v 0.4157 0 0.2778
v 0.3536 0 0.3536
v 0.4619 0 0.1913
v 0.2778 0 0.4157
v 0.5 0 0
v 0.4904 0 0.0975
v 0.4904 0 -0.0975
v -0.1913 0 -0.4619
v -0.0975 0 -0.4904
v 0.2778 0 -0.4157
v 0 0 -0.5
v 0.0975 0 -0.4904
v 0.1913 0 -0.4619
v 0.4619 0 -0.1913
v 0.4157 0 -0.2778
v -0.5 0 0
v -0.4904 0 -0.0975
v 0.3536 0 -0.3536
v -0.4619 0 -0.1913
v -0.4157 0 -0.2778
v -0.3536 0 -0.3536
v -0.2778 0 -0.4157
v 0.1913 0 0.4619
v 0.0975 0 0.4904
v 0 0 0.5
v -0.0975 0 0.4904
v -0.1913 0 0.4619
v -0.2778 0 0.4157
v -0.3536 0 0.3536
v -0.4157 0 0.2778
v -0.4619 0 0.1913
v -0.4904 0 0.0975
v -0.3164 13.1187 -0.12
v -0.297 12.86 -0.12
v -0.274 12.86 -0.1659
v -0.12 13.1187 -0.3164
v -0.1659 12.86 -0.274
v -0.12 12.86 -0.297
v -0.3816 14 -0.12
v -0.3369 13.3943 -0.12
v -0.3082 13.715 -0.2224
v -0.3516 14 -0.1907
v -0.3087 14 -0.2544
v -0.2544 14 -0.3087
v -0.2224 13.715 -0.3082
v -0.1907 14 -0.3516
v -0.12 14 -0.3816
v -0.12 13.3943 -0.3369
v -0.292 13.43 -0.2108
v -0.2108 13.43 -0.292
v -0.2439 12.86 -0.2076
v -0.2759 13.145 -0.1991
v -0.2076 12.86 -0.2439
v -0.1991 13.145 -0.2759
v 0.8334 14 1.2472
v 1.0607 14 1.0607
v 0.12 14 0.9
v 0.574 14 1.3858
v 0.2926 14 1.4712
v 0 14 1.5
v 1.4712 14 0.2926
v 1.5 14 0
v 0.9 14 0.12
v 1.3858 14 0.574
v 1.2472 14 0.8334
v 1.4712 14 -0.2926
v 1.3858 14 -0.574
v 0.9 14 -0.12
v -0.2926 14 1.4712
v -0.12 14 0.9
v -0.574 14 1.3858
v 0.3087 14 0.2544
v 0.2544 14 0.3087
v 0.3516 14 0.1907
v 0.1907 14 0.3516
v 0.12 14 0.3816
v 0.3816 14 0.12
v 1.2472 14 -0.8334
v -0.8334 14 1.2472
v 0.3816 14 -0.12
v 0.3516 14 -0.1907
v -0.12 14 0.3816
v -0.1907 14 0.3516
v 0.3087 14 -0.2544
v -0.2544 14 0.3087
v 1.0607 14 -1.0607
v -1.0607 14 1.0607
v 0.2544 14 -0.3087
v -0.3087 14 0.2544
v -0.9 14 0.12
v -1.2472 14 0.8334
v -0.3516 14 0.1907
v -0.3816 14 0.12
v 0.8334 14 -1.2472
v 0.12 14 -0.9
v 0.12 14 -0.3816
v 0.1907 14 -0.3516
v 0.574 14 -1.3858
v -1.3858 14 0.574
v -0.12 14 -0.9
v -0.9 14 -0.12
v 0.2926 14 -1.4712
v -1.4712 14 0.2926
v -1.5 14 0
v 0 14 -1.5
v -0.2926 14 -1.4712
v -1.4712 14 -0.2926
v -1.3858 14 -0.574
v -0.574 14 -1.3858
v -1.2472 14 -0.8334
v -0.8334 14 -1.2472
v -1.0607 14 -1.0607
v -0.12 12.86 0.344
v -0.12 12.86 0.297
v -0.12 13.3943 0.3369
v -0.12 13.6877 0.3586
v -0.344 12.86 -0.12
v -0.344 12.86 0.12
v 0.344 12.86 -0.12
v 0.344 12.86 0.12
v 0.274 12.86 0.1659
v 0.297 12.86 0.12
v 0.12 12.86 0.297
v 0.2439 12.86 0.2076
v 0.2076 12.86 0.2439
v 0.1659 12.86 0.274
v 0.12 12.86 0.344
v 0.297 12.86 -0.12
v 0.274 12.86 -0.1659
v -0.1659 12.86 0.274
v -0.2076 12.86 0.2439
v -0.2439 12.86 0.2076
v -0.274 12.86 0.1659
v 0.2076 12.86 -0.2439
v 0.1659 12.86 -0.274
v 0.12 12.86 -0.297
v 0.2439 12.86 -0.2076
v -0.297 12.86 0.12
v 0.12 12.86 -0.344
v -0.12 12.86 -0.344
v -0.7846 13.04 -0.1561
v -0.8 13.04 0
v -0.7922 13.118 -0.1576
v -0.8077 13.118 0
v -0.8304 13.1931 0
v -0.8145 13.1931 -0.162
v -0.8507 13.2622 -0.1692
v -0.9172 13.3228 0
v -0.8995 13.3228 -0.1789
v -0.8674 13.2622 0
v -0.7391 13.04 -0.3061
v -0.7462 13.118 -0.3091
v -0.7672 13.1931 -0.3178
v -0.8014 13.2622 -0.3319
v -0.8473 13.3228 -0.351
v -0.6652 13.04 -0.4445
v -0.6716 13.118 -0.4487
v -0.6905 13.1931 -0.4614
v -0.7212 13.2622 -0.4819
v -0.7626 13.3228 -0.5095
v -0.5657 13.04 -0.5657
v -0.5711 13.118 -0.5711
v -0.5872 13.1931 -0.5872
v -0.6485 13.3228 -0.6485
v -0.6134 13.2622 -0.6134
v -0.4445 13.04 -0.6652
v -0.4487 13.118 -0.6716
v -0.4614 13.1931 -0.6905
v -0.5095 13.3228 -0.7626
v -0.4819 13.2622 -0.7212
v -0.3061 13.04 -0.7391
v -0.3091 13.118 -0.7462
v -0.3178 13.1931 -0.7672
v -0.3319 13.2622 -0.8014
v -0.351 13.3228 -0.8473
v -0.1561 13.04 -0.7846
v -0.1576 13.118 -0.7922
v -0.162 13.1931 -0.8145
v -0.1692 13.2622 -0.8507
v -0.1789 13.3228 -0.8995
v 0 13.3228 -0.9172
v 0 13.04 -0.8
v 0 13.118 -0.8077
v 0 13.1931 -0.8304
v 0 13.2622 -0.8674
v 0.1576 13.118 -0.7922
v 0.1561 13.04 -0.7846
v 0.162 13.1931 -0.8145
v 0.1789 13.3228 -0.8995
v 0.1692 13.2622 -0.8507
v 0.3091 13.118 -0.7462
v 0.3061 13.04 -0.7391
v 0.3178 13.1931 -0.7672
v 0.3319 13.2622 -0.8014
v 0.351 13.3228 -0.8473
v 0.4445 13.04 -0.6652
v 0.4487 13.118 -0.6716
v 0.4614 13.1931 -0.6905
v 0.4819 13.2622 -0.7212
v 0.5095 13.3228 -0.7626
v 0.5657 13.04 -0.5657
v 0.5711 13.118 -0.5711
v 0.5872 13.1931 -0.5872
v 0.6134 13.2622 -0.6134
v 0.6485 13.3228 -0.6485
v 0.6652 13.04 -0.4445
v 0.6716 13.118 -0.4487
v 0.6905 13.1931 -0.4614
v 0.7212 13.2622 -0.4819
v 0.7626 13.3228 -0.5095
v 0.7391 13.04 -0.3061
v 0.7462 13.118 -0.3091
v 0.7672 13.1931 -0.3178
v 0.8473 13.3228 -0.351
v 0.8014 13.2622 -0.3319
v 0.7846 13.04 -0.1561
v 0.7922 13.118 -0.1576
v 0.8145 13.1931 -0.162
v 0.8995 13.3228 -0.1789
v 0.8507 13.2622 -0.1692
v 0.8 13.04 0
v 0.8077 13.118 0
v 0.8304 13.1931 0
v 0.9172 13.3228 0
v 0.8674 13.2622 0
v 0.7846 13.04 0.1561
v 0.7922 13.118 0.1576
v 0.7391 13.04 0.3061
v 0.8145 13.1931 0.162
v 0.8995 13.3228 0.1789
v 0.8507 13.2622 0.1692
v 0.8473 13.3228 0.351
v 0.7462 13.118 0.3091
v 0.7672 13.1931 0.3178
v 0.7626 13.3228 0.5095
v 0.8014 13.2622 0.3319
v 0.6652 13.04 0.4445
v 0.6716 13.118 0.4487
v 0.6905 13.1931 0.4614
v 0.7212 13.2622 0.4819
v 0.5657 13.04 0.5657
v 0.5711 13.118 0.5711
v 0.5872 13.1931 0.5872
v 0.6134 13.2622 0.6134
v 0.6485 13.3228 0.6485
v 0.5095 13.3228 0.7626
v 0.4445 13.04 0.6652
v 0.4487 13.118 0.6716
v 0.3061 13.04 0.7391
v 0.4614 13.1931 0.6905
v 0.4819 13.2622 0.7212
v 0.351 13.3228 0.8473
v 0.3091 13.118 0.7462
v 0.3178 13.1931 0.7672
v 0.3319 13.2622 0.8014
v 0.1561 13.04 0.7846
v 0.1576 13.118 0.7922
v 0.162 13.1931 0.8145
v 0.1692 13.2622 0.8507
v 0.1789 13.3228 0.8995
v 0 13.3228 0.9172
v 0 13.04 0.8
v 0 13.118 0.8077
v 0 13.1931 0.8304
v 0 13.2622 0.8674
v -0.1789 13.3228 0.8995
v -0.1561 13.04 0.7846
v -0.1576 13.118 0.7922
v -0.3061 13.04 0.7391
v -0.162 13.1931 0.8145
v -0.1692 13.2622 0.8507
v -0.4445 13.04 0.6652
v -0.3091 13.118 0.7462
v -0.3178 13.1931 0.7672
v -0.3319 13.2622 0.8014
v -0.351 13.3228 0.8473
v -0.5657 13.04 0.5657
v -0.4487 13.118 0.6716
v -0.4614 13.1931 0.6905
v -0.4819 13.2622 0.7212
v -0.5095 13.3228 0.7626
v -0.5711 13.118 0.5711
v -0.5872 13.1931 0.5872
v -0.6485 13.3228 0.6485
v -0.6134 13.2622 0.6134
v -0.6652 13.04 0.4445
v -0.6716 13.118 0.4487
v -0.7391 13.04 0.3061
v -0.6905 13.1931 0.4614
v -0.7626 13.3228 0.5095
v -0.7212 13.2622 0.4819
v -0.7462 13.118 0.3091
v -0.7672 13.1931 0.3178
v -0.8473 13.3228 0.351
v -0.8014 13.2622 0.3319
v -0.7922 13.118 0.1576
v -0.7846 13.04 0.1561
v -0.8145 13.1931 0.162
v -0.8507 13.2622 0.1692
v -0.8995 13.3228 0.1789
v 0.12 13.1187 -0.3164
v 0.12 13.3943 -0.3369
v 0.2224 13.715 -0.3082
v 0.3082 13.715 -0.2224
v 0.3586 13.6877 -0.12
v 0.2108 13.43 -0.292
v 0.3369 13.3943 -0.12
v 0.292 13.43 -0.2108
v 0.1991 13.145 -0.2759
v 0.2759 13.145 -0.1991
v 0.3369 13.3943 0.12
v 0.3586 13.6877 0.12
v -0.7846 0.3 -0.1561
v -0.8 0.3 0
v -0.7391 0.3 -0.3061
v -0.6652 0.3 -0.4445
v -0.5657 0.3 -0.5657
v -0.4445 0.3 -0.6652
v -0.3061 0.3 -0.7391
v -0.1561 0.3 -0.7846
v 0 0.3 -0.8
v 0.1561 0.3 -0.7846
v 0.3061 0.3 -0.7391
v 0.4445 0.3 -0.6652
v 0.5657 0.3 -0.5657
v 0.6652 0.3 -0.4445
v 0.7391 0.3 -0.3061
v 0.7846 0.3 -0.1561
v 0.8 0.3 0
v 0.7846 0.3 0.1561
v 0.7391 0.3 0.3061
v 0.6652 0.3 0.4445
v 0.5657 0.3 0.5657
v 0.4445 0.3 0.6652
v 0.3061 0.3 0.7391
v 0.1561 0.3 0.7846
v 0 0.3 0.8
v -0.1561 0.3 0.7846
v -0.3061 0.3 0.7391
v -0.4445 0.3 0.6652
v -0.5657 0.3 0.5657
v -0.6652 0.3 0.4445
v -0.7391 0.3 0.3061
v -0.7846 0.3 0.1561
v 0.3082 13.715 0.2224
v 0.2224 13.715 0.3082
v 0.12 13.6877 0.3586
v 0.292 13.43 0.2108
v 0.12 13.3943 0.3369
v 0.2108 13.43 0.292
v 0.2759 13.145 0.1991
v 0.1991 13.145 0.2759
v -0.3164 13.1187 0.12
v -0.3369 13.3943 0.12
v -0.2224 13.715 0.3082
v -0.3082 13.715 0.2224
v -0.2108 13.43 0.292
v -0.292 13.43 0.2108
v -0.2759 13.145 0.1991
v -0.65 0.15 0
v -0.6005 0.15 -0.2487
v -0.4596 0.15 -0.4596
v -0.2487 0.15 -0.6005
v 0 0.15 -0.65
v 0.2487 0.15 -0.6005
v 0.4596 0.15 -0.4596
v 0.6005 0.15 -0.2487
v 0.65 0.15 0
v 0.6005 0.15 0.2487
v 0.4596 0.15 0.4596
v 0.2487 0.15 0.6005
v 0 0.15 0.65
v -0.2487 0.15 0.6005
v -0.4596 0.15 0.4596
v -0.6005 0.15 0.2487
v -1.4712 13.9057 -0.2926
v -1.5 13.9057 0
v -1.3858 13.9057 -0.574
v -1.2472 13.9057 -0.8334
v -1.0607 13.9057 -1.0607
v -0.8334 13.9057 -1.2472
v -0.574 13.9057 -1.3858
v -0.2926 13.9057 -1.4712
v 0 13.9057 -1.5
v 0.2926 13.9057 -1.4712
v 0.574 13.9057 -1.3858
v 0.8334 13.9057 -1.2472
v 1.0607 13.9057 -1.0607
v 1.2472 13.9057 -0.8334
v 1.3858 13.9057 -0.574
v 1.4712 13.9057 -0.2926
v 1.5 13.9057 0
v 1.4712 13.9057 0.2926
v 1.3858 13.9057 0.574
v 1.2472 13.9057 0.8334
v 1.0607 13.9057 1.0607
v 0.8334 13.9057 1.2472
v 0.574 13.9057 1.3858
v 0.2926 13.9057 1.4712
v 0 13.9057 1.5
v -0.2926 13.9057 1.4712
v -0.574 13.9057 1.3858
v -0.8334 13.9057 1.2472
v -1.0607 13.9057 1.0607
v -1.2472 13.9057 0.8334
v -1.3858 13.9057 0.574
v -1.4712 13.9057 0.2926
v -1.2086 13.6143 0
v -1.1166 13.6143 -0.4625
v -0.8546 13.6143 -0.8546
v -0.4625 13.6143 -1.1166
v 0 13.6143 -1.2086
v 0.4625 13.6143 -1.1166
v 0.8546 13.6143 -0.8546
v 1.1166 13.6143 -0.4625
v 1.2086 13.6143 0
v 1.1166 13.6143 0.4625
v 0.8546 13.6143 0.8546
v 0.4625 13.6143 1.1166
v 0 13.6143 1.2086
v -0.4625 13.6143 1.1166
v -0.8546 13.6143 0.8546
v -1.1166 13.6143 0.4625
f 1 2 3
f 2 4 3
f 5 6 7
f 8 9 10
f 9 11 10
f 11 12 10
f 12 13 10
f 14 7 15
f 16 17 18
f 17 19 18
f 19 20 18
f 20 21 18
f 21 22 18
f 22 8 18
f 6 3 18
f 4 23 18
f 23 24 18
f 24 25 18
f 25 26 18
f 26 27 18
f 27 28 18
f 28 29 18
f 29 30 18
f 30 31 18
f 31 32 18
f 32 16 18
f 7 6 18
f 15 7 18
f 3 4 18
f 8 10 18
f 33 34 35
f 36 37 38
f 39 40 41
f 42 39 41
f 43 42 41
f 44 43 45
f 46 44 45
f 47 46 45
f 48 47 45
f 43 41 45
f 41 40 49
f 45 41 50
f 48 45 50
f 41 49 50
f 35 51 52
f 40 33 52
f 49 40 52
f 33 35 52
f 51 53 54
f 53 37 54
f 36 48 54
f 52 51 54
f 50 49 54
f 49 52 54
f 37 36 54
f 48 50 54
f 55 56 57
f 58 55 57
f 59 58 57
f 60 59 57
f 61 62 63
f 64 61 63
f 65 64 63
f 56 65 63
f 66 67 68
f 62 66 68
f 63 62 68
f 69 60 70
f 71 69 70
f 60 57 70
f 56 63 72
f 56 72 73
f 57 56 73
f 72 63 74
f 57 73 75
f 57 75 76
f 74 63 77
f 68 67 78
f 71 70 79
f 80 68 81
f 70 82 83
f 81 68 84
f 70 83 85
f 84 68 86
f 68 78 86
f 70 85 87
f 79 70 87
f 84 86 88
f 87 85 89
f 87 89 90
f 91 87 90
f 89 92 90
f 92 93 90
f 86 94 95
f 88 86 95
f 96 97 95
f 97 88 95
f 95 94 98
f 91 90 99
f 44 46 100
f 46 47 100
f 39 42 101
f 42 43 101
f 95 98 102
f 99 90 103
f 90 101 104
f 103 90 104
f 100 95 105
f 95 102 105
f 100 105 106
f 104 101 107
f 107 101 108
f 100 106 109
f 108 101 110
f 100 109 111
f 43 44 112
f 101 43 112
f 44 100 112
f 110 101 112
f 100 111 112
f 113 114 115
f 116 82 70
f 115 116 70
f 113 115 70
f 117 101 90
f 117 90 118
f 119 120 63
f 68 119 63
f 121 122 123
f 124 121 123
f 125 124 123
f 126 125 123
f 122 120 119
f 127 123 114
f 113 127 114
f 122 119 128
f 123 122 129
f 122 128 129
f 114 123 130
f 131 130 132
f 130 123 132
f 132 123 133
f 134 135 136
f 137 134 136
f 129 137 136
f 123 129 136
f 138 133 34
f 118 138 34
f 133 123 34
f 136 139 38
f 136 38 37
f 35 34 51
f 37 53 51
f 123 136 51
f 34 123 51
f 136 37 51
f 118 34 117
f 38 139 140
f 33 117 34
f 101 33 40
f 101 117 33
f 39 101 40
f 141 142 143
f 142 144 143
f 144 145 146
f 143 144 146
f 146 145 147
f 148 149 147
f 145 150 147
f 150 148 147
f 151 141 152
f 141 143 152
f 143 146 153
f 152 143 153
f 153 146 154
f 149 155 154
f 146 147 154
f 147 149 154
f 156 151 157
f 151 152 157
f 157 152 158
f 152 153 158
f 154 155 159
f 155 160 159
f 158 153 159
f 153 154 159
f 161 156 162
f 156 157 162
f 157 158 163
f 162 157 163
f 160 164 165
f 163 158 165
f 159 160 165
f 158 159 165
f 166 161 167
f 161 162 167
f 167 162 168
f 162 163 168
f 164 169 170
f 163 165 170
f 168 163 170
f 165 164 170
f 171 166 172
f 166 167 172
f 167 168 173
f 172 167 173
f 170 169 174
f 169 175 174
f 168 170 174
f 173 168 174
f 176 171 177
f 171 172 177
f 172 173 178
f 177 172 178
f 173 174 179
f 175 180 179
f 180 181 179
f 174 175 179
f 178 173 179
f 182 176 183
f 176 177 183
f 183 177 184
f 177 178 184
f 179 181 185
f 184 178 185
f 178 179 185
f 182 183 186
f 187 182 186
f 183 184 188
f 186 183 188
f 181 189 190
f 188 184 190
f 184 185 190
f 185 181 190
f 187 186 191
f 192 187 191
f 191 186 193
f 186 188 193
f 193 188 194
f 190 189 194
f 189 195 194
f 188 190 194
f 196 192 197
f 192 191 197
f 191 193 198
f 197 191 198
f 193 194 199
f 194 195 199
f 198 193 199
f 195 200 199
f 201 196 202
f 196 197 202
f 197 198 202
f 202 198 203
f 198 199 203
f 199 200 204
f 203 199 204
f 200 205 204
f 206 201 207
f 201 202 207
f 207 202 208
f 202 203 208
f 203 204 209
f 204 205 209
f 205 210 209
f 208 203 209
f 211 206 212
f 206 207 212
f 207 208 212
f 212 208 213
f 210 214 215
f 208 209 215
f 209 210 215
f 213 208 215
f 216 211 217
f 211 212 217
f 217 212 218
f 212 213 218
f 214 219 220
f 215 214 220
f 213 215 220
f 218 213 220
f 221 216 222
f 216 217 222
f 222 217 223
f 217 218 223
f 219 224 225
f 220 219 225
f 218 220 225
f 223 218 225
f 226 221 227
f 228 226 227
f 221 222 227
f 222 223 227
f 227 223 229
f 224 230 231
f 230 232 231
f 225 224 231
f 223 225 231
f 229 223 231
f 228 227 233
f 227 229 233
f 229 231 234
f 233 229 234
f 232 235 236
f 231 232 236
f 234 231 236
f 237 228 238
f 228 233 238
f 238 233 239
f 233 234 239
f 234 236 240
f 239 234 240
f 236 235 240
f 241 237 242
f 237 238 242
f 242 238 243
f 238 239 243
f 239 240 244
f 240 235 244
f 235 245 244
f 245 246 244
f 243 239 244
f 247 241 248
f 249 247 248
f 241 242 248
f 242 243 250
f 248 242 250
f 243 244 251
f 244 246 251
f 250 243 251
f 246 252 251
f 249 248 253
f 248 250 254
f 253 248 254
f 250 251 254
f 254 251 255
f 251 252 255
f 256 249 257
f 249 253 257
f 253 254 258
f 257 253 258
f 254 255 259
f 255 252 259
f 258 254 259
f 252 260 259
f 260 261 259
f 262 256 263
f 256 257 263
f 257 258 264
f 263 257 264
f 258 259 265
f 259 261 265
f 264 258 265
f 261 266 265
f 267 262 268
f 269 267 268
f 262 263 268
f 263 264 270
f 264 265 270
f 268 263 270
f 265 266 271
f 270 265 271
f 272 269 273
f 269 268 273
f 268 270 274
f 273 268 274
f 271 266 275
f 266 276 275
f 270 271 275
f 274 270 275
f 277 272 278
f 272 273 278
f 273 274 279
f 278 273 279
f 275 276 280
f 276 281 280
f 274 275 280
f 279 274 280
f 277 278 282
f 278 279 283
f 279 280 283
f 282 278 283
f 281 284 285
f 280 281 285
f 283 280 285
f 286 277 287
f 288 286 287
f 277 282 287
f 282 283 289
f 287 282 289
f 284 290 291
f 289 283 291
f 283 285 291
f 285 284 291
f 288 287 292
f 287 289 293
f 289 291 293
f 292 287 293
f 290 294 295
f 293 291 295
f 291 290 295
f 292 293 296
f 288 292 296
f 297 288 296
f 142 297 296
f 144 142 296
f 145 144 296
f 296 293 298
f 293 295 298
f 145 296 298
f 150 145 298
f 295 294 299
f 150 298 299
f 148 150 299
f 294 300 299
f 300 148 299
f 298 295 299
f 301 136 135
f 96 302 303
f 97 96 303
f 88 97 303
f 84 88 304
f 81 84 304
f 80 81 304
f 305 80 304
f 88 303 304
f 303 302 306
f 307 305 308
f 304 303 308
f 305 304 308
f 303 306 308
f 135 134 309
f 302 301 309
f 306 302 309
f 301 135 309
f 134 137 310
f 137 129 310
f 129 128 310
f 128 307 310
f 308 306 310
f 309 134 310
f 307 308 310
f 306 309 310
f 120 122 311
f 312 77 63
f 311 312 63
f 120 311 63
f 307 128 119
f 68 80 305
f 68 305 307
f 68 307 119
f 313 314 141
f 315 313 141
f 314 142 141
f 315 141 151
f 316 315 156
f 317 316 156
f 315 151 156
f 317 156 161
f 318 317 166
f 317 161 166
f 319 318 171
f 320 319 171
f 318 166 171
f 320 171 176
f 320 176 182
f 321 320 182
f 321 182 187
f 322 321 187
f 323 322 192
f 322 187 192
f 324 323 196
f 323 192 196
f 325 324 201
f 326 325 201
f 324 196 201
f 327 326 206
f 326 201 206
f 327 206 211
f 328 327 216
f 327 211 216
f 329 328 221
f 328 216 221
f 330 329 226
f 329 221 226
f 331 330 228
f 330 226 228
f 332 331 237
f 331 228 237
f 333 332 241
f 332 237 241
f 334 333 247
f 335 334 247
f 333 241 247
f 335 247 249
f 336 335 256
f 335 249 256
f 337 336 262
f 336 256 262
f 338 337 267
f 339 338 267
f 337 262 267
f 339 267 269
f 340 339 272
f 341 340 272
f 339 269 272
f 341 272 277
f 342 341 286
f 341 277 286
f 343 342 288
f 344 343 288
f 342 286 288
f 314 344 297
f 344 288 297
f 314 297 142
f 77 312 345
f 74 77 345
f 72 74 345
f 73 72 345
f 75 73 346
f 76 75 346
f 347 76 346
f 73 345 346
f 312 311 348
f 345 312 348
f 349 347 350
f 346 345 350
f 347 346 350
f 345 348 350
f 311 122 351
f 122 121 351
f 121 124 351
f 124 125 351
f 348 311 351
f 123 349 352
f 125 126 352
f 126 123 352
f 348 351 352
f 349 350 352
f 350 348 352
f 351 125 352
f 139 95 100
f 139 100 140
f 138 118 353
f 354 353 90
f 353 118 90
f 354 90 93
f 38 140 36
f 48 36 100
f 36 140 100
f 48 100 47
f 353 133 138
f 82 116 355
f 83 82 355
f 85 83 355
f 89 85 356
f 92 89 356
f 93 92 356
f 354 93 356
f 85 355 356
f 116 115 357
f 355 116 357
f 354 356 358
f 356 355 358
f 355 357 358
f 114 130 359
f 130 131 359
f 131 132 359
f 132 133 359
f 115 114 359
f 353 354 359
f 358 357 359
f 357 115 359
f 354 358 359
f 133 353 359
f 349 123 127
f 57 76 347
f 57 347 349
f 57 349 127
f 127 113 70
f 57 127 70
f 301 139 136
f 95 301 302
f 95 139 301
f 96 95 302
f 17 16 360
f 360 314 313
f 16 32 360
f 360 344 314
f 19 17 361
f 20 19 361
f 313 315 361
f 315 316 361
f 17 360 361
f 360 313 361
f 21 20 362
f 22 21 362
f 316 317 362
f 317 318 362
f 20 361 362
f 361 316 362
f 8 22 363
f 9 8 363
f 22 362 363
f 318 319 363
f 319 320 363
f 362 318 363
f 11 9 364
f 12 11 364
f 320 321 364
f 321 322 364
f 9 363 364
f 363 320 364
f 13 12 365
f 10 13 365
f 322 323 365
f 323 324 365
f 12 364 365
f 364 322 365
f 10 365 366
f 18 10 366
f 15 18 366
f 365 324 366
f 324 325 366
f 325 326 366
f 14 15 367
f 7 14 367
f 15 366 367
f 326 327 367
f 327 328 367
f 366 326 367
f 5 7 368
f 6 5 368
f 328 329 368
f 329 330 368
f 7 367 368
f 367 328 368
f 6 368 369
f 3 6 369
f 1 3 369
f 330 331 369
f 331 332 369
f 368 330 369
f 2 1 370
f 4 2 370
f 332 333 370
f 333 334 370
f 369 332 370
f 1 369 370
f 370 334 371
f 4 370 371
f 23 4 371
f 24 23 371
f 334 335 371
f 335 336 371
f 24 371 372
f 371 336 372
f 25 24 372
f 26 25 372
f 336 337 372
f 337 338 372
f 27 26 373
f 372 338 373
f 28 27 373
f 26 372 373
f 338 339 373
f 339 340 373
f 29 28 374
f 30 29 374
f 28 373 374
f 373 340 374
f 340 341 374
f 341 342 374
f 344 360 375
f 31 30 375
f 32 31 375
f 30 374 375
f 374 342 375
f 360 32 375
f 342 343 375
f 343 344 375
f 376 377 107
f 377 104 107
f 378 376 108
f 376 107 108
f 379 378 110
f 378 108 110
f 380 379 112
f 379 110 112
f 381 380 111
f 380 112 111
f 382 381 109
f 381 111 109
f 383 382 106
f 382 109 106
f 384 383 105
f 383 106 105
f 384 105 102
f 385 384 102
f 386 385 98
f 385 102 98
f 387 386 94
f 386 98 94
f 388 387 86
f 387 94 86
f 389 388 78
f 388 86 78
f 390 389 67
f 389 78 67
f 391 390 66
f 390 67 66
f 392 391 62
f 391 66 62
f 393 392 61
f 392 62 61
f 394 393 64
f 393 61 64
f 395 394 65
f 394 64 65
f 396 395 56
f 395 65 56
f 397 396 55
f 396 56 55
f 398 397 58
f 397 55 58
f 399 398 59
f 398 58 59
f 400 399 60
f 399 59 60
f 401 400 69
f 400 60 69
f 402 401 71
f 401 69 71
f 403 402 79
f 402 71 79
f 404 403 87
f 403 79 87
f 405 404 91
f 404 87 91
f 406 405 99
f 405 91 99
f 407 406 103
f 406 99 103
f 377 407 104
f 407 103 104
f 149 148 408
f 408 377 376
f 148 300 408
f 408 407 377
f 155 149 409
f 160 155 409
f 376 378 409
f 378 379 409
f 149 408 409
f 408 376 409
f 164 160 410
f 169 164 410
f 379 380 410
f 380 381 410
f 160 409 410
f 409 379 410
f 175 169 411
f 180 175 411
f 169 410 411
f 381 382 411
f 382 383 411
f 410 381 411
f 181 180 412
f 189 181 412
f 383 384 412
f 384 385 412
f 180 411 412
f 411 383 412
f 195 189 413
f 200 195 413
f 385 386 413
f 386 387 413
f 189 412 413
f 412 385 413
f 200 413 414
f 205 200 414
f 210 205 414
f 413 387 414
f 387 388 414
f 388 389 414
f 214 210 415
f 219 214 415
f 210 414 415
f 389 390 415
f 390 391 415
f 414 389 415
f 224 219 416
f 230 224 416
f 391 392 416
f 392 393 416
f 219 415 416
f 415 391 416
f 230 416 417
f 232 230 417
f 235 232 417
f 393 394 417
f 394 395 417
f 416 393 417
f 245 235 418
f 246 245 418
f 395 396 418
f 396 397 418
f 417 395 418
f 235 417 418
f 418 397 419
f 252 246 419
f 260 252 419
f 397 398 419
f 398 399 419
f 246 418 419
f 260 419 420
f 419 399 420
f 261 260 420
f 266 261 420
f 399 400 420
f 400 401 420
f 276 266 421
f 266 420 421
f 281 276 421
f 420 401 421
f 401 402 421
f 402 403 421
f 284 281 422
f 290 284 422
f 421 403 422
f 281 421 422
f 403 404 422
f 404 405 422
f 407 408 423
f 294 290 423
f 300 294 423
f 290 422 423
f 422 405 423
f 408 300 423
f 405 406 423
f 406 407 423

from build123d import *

# Parameters (mm, degrees)
CUT_EXTRUDE_2_DEPTH      = 0.12
CUT_EXTRUDE_2_DEPTH_BACK = 0.12
CUT_EXTRUDE_3_DEPTH      = 0.12
CUT_EXTRUDE_3_DEPTH_BACK = 0.12


with BuildPart() as part:
    # Эскиз1 → Повернуть1 (revolve)
    with BuildSketch(Plane.XY):
        with BuildLine():
            Line((0, 0), (-0.5, 0))
            Line((-0.5, 0), (-0.8, 0.3))
            Line((-0.8, 0.3), (-0.8, 13.04))
            ThreePointArc((-0.8, 13.04), (-0.830448187, 13.193073373), (-0.917157288, 13.322842712))
            Line((-0.917157288, 13.322842712), (-1.5, 13.905685425))
            Line((-1.5, 13.905685425), (-1.5, 14))
            Line((-1.5, 14), (-0.4, 14))
            Line((-0.4, 14), (-0.320283434, 12.86))
            Line((-0.320283434, 12.86), (0, 12.86))
            Line((0, 12.86), (0, 0))
        make_face()
    revolve(axis=Axis((0, 12.86, 0), (0, -1, 0)))

    # Эскиз3 → Вырез-Вытянуть2 (cut, two sides: drawn at the far end of the back side and taken through both)
    with BuildSketch(Plane.XY.offset(-CUT_EXTRUDE_2_DEPTH_BACK)):
        Polygon((-0.9, 14), (-0.343984849, 12.86), (0.343984849, 12.86), (0.9, 14), align=None)
    extrude(amount=CUT_EXTRUDE_2_DEPTH + CUT_EXTRUDE_2_DEPTH_BACK, mode=Mode.SUBTRACT)

    # Эскиз4 → Вырез-Вытянуть3 (cut, two sides: drawn at the far end of the back side and taken through both)
    with BuildSketch(Plane(origin=(0, 0, 0), x_dir=(0, 0, -1), z_dir=(1, 0, 0)).offset(-CUT_EXTRUDE_3_DEPTH_BACK)):
        Polygon((-0.343984849, 12.86), (-0.9, 14), (0.9, 14), (0.343984849, 12.86), align=None)
    extrude(amount=CUT_EXTRUDE_3_DEPTH + CUT_EXTRUDE_3_DEPTH_BACK, mode=Mode.SUBTRACT)


solid = part.part
